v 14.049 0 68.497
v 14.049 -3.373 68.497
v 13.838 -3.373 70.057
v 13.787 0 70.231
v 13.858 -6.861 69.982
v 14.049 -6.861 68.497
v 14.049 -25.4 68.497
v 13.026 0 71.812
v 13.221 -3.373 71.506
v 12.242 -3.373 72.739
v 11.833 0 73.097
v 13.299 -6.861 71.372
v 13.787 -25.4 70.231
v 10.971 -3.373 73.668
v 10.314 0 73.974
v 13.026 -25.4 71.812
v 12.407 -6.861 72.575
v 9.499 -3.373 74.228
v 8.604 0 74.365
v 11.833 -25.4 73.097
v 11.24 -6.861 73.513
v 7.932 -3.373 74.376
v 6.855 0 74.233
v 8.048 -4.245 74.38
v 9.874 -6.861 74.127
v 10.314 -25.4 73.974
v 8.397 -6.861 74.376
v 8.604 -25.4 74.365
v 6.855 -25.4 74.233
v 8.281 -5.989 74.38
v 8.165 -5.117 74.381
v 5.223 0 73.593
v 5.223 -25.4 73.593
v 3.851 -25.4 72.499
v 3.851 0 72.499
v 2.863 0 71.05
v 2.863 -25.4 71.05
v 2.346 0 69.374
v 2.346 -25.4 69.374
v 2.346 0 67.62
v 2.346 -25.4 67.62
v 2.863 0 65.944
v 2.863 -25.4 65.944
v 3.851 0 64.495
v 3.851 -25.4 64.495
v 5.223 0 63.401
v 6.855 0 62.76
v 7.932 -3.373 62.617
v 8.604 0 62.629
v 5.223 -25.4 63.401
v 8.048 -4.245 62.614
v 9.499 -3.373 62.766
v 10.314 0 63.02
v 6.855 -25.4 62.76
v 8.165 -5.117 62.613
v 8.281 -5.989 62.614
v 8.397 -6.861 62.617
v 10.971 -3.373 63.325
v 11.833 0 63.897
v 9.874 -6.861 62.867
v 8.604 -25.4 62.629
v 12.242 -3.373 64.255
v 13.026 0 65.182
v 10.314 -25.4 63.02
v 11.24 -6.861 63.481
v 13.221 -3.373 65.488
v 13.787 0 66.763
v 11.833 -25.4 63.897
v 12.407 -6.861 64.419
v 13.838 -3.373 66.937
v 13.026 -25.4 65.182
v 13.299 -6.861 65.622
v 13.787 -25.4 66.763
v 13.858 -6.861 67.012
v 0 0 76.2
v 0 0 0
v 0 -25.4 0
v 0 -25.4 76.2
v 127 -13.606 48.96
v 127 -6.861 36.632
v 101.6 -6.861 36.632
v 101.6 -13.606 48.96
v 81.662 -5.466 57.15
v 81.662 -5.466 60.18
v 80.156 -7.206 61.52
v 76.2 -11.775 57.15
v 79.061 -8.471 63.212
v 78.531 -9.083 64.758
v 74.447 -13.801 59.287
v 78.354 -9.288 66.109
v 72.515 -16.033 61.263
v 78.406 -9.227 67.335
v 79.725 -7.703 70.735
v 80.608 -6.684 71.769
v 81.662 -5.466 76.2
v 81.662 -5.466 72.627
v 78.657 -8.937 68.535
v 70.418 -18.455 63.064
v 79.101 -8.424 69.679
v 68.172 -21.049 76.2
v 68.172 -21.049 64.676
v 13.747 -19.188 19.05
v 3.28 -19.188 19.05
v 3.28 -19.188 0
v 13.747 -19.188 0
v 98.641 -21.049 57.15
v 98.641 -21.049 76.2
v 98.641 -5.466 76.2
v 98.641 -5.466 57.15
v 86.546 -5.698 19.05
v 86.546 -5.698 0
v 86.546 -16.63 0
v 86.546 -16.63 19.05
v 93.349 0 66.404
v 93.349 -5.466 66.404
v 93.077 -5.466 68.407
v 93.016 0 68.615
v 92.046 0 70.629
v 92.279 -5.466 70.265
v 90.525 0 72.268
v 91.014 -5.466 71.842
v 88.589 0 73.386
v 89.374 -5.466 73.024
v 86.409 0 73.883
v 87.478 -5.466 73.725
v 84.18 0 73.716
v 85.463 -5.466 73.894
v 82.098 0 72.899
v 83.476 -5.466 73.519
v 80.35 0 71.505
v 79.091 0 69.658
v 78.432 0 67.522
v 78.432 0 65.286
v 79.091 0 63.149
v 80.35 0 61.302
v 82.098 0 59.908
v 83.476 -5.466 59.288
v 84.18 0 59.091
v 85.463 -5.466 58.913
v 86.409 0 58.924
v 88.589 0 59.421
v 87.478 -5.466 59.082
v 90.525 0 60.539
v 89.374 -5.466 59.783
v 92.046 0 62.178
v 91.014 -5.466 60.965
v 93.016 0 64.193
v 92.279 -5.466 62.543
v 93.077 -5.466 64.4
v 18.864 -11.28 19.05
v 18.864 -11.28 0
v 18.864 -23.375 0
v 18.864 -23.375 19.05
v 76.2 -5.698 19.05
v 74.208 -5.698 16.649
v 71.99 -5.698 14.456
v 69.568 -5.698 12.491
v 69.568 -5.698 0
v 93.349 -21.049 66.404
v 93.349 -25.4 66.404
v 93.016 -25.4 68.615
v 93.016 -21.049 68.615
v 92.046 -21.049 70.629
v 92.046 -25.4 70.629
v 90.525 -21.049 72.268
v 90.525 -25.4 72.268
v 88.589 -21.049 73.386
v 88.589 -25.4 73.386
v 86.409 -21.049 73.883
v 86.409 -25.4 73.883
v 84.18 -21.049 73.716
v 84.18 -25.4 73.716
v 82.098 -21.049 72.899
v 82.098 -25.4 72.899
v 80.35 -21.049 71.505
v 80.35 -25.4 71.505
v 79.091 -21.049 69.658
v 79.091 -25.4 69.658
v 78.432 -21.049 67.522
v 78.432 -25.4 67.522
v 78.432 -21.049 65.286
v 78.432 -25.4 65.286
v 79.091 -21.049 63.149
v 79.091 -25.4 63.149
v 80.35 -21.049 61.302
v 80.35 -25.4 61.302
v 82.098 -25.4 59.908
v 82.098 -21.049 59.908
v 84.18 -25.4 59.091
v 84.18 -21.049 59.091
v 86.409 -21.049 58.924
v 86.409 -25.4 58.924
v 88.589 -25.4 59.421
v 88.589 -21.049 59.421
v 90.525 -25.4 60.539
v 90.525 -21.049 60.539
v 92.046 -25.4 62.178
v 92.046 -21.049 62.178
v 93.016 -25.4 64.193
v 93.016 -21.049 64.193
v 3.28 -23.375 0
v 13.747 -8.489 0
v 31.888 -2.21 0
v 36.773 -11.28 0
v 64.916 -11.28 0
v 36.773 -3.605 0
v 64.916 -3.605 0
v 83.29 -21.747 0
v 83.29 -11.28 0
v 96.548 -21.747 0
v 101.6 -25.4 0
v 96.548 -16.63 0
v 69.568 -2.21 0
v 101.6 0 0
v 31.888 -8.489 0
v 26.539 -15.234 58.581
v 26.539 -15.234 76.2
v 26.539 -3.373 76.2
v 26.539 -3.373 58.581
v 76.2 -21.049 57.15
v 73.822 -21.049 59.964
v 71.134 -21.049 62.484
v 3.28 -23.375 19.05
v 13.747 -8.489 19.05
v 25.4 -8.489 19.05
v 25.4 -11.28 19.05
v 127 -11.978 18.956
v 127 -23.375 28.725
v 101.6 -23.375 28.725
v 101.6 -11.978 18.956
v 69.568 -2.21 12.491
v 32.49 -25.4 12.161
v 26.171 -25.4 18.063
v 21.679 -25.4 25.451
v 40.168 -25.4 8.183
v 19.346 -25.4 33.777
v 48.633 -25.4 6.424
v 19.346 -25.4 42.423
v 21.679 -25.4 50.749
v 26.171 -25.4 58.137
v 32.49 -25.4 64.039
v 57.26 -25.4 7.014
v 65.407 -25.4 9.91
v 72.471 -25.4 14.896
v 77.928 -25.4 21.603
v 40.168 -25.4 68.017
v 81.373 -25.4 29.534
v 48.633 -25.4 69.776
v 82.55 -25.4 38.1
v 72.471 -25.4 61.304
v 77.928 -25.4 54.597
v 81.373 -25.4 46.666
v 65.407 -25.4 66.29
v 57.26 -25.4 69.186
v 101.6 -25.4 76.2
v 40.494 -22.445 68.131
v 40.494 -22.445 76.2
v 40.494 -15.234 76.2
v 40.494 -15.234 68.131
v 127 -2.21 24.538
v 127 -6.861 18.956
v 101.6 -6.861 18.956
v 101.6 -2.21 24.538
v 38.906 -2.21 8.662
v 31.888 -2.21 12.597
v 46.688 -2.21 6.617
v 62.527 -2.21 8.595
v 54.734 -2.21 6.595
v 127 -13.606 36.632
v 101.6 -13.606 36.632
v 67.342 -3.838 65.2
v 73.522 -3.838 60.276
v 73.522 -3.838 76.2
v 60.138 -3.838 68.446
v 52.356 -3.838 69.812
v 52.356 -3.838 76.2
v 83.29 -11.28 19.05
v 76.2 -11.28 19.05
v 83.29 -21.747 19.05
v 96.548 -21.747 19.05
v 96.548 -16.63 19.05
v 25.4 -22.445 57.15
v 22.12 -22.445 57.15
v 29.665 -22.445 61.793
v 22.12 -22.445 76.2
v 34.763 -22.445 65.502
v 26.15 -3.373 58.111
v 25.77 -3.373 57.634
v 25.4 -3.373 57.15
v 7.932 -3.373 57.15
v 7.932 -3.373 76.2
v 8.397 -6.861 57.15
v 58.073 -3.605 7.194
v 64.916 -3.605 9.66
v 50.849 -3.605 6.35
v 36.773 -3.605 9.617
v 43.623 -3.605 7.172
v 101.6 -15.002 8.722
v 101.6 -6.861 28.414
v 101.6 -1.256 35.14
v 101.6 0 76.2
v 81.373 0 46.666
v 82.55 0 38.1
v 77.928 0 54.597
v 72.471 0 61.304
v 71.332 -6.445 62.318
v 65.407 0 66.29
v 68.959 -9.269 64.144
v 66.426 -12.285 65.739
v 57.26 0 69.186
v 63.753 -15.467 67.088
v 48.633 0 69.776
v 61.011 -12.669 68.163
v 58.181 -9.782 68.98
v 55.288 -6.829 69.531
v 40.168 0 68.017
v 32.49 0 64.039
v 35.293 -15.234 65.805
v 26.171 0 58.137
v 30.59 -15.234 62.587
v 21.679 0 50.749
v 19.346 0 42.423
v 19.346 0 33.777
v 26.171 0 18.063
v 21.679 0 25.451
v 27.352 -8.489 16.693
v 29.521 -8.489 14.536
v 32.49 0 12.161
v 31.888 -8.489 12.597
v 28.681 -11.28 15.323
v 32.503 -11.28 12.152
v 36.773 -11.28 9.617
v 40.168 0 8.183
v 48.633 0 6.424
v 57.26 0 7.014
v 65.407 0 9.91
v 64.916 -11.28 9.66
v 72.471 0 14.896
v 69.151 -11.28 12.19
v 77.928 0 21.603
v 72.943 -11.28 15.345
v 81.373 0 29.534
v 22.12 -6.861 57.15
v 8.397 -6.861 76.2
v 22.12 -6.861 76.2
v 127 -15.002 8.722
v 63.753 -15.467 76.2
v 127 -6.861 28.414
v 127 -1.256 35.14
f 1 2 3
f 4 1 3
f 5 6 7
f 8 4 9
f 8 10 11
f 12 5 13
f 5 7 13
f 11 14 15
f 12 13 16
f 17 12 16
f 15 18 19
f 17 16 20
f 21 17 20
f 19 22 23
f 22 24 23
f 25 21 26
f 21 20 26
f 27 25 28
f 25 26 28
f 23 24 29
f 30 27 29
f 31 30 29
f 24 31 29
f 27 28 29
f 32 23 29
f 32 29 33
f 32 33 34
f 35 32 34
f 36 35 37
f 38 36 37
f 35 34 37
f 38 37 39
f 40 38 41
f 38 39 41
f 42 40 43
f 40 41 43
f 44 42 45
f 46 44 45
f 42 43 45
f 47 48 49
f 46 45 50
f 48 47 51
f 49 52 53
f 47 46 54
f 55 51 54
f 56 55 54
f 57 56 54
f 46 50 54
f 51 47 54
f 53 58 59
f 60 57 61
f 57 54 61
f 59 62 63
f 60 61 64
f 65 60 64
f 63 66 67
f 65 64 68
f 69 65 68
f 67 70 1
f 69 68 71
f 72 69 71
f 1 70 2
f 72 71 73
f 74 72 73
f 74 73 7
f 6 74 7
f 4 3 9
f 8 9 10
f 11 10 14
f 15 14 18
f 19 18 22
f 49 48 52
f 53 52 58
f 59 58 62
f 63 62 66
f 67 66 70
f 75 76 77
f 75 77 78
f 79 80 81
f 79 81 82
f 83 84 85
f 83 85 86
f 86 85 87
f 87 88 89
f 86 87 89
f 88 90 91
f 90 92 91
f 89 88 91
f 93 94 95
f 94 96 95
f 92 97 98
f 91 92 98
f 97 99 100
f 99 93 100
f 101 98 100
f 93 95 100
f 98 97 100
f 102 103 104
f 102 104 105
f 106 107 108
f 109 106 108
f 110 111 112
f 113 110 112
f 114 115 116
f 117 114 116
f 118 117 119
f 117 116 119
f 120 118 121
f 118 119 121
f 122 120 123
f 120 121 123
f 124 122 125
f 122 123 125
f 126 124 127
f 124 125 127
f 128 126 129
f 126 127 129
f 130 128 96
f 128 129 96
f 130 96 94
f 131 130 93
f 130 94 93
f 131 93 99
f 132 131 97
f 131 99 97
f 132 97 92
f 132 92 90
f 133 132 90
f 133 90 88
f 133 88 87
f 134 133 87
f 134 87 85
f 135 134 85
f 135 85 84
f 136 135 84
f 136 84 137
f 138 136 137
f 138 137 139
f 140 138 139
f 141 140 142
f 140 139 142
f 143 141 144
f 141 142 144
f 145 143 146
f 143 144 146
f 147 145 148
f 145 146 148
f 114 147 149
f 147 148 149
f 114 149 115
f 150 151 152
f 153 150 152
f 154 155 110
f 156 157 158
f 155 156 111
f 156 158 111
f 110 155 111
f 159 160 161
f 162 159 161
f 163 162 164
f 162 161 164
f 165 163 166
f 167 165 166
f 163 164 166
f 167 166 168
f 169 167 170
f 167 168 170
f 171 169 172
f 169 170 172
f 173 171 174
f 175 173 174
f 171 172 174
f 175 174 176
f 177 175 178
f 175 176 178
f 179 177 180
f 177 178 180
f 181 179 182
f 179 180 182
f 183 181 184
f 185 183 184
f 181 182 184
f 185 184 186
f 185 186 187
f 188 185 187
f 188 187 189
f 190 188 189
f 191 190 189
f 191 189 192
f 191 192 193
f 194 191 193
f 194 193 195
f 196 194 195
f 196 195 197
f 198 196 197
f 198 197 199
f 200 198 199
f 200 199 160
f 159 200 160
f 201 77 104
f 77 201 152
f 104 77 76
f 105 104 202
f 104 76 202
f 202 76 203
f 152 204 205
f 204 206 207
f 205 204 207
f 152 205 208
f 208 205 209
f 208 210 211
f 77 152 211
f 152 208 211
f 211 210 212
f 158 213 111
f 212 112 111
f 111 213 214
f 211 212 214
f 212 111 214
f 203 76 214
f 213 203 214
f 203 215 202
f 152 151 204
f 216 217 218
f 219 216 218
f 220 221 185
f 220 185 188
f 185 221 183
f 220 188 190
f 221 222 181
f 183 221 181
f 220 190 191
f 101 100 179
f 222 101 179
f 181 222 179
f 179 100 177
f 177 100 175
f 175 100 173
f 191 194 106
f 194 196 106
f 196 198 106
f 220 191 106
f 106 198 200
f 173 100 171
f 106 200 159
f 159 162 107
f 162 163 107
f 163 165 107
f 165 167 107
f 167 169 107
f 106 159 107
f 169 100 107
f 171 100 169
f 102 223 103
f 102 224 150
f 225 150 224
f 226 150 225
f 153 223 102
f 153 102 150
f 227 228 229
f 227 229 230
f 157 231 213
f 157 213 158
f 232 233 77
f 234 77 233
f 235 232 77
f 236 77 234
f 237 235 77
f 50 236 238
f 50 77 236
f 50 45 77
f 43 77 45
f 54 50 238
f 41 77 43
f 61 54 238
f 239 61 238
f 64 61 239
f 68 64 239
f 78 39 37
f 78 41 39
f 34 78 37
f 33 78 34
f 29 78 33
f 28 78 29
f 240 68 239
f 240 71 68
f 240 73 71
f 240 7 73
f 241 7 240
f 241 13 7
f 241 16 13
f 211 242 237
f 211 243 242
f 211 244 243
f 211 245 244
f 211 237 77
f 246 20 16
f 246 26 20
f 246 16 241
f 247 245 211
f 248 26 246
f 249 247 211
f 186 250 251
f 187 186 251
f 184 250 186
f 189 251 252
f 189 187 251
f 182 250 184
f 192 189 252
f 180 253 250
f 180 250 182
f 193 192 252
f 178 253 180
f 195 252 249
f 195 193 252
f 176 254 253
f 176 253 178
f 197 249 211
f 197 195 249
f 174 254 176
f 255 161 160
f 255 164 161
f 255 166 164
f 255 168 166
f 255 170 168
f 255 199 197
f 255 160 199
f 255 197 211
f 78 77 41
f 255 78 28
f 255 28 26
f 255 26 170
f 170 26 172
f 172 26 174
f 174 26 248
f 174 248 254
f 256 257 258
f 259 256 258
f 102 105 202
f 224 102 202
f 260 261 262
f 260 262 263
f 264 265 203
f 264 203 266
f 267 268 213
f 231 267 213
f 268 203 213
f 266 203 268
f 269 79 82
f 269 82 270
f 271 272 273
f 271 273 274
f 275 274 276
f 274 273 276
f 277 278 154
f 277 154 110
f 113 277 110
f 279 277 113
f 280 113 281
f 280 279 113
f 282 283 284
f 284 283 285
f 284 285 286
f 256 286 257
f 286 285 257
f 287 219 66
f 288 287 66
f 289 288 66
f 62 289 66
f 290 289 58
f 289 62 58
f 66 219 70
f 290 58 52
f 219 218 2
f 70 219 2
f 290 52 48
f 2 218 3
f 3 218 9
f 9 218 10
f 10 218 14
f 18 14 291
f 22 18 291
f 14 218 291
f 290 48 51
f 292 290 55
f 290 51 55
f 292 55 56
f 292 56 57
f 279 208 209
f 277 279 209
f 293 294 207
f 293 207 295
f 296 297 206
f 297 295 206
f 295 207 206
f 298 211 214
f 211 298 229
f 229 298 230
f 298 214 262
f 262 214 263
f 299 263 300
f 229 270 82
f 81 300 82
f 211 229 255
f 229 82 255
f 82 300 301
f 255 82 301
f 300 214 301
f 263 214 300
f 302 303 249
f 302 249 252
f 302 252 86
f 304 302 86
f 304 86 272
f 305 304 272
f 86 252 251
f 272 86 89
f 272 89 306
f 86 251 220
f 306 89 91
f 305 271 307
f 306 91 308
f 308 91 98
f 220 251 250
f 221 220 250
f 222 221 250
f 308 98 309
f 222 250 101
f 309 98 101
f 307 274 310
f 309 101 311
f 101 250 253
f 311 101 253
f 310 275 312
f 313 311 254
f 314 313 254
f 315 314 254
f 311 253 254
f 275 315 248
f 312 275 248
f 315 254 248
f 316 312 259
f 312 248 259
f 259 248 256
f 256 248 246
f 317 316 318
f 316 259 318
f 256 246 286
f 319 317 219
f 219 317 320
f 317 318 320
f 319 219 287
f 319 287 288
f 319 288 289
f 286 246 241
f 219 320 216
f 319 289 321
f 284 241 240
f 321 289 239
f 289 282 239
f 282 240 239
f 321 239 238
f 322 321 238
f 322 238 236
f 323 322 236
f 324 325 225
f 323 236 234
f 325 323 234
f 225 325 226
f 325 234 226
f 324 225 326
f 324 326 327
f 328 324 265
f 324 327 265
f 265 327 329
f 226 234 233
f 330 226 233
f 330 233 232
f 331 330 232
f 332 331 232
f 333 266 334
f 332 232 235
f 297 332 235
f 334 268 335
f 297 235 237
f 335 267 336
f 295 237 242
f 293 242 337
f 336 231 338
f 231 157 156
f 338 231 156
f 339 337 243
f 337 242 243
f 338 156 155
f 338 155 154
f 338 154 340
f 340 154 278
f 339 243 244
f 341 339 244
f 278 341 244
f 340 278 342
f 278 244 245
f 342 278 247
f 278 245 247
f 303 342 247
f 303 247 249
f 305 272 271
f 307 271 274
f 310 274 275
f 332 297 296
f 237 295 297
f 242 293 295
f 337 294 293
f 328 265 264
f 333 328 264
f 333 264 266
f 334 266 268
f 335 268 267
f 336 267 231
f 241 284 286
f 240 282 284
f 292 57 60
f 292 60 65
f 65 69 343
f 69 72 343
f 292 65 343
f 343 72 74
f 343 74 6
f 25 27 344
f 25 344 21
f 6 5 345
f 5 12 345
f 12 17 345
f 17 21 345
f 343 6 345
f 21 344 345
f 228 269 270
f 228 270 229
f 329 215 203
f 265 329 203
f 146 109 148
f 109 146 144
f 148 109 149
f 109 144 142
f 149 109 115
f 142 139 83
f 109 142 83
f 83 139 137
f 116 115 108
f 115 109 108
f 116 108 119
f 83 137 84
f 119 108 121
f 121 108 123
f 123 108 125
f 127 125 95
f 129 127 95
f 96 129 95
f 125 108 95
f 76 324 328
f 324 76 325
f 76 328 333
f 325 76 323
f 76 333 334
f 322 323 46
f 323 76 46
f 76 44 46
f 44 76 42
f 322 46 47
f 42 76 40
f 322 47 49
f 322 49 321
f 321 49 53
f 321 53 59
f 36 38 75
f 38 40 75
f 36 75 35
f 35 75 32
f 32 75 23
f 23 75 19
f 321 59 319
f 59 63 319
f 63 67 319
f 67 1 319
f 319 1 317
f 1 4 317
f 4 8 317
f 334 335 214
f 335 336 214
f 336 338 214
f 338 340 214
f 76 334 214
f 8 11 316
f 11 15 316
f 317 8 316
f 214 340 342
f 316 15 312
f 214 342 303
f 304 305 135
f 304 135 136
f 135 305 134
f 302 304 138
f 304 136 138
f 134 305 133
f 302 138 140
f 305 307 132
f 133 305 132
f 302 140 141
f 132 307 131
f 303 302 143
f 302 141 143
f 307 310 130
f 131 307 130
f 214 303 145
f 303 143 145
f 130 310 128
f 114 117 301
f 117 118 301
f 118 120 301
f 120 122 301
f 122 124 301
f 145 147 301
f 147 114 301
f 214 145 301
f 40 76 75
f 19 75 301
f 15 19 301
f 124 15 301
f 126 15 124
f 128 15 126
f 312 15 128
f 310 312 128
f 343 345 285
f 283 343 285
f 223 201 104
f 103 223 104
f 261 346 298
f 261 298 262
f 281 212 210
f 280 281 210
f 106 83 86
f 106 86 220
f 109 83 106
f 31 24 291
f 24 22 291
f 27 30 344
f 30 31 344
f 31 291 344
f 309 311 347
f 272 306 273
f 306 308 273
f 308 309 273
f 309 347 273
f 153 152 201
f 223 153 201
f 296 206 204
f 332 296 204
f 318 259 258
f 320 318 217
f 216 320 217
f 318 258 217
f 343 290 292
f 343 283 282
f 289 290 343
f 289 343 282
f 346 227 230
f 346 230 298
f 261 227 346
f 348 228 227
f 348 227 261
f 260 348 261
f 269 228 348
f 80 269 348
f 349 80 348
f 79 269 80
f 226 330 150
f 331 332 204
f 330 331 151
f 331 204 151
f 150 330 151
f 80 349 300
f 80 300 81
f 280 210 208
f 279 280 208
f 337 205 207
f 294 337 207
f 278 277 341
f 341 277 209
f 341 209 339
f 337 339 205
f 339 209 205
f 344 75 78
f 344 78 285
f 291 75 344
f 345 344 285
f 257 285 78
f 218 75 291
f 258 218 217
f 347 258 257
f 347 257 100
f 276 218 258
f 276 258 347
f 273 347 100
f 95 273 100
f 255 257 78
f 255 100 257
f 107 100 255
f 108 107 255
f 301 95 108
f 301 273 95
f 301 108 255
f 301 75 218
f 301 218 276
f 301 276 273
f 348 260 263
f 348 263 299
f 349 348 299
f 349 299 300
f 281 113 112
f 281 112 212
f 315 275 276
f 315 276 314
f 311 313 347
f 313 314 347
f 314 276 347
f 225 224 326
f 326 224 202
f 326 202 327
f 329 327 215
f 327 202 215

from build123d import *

# Parameters (mm, degrees)
F0_W      = 101.6
F0_H      = 76.2
F1_DEPTH  = 25.4
F2_R      = 31.75
F3_DEPTH  = 25.4
F3_FACE_R = 31.75
F4_DEPTH  = 50.801
F5_R      = 5.884043
F6_DEPTH  = 25.401
F7_R      = 7.500717
F8_DEPTH  = 25.401
F10_DEPTH = 19.05
F12_DEPTH = 19.05
F14_DEPTH = 19.05
F16_DEPTH = 19.05
F18_DEPTH = 25.4


with BuildPart() as f1:
    # F0 (on Front) → F1 (new body)
    with BuildSketch(Plane.XZ):
        with Locations((50.8, 38.1)):
            Rectangle(F0_W, F0_H)
    extrude(amount=F1_DEPTH)

    # F2 (on face) → F3 (join)
    with BuildSketch(Plane.XZ.offset(25.4)):
        with Locations((50.8, 38.1)):
            Circle(F2_R)
    extrude(amount=F3_DEPTH)

    # F3_face (on face) → F4 (cut, through all)
    with BuildSketch(Plane(origin=(50.8, -50.8, 38.1), x_dir=(1, 0, 0), z_dir=(0, -1, 0))):
        Circle(F3_FACE_R)
    extrude(amount=-F4_DEPTH, mode=Mode.SUBTRACT)

    # F5 (on face) → F6 (cut, through all)
    with BuildSketch(Plane.XZ.offset(25.4)):
        with Locations((8.164548, 68.496935)):
            Circle(F5_R)
    extrude(amount=-F6_DEPTH, mode=Mode.SUBTRACT)

    # F7 (on face) → F8 (cut, through all)
    with BuildSketch(Plane.XZ.offset(25.4)):
        with Locations((85.848674, 66.40365)):
            Circle(F7_R)
    extrude(amount=-F8_DEPTH, mode=Mode.SUBTRACT)

    # F9 (on face) → F10 (cut)
    with BuildSketch(Plane.XY.offset(76.2)):
        Polygon((73.521554, -3.837689), (52.356116, -3.837689), (63.75289, -15.46705), align=None)
    extrude(amount=-F10_DEPTH, mode=Mode.SUBTRACT)

    # F11 (on face) → F12 (cut)
    with BuildSketch(Plane.XY.offset(76.2)):
        Polygon((26.538938, -3.372515), (7.931962, -3.372515), (8.397136, -6.861323), (22.119781, -6.861323), (22.119781, -22.444667), (26.538938, -22.444667), (40.49417, -22.444667), (40.49417, -15.234463), (26.538938, -15.234463), align=None)
    extrude(amount=-F12_DEPTH, mode=Mode.SUBTRACT)

    # F13 (on face) → F14 (cut)
    with BuildSketch(Plane.XY.offset(76.2)):
        Polygon((98.640978, -5.465799), (81.662104, -5.465799), (68.172053, -21.049144), (98.640978, -21.049144), align=None)
    extrude(amount=-F14_DEPTH, mode=Mode.SUBTRACT)

    # F15 (on face) → F16 (cut)
    with BuildSketch(Plane(origin=(0, 0, 0), x_dir=(1, 0, 0), z_dir=(0, 0, -1))):
        Polygon((18.863561, 23.375014), (3.280218, 23.375014), (3.280218, 19.188445), (13.746641, 19.188445), (13.746641, 8.489433), (18.398385, 8.489433), (31.888444, 8.489433), (31.888444, 2.209579), (69.567569, 2.209579), (69.567569, 5.698387), (86.546443, 5.698387), (86.546443, 10.582718), (86.546443, 16.629985), (96.547693, 16.629985), (96.547693, 21.746906), (83.290212, 21.746906), (83.290212, 11.280479), (64.915828, 11.280479), (64.915828, 3.605102), (36.772776, 3.605102), (36.772776, 11.280479), (18.863561, 11.280479), align=None)
    extrude(amount=-F16_DEPTH, mode=Mode.SUBTRACT)

    # F17 (on face) → F18 (join)
    with BuildSketch(Plane.YZ.offset(101.6)):
        Polygon((-23.375014, 28.724518), (-11.978242, 18.955858), (-15.001875, 8.72202), (-6.861323, 18.955858), (-2.209579, 24.537953), (-6.861323, 28.414406), (-1.256352, 35.140372), (-6.861323, 36.632486), (-13.606353, 48.959609), (-13.606353, 36.632486), align=None)
    extrude(amount=F18_DEPTH)


solid = f1.part
